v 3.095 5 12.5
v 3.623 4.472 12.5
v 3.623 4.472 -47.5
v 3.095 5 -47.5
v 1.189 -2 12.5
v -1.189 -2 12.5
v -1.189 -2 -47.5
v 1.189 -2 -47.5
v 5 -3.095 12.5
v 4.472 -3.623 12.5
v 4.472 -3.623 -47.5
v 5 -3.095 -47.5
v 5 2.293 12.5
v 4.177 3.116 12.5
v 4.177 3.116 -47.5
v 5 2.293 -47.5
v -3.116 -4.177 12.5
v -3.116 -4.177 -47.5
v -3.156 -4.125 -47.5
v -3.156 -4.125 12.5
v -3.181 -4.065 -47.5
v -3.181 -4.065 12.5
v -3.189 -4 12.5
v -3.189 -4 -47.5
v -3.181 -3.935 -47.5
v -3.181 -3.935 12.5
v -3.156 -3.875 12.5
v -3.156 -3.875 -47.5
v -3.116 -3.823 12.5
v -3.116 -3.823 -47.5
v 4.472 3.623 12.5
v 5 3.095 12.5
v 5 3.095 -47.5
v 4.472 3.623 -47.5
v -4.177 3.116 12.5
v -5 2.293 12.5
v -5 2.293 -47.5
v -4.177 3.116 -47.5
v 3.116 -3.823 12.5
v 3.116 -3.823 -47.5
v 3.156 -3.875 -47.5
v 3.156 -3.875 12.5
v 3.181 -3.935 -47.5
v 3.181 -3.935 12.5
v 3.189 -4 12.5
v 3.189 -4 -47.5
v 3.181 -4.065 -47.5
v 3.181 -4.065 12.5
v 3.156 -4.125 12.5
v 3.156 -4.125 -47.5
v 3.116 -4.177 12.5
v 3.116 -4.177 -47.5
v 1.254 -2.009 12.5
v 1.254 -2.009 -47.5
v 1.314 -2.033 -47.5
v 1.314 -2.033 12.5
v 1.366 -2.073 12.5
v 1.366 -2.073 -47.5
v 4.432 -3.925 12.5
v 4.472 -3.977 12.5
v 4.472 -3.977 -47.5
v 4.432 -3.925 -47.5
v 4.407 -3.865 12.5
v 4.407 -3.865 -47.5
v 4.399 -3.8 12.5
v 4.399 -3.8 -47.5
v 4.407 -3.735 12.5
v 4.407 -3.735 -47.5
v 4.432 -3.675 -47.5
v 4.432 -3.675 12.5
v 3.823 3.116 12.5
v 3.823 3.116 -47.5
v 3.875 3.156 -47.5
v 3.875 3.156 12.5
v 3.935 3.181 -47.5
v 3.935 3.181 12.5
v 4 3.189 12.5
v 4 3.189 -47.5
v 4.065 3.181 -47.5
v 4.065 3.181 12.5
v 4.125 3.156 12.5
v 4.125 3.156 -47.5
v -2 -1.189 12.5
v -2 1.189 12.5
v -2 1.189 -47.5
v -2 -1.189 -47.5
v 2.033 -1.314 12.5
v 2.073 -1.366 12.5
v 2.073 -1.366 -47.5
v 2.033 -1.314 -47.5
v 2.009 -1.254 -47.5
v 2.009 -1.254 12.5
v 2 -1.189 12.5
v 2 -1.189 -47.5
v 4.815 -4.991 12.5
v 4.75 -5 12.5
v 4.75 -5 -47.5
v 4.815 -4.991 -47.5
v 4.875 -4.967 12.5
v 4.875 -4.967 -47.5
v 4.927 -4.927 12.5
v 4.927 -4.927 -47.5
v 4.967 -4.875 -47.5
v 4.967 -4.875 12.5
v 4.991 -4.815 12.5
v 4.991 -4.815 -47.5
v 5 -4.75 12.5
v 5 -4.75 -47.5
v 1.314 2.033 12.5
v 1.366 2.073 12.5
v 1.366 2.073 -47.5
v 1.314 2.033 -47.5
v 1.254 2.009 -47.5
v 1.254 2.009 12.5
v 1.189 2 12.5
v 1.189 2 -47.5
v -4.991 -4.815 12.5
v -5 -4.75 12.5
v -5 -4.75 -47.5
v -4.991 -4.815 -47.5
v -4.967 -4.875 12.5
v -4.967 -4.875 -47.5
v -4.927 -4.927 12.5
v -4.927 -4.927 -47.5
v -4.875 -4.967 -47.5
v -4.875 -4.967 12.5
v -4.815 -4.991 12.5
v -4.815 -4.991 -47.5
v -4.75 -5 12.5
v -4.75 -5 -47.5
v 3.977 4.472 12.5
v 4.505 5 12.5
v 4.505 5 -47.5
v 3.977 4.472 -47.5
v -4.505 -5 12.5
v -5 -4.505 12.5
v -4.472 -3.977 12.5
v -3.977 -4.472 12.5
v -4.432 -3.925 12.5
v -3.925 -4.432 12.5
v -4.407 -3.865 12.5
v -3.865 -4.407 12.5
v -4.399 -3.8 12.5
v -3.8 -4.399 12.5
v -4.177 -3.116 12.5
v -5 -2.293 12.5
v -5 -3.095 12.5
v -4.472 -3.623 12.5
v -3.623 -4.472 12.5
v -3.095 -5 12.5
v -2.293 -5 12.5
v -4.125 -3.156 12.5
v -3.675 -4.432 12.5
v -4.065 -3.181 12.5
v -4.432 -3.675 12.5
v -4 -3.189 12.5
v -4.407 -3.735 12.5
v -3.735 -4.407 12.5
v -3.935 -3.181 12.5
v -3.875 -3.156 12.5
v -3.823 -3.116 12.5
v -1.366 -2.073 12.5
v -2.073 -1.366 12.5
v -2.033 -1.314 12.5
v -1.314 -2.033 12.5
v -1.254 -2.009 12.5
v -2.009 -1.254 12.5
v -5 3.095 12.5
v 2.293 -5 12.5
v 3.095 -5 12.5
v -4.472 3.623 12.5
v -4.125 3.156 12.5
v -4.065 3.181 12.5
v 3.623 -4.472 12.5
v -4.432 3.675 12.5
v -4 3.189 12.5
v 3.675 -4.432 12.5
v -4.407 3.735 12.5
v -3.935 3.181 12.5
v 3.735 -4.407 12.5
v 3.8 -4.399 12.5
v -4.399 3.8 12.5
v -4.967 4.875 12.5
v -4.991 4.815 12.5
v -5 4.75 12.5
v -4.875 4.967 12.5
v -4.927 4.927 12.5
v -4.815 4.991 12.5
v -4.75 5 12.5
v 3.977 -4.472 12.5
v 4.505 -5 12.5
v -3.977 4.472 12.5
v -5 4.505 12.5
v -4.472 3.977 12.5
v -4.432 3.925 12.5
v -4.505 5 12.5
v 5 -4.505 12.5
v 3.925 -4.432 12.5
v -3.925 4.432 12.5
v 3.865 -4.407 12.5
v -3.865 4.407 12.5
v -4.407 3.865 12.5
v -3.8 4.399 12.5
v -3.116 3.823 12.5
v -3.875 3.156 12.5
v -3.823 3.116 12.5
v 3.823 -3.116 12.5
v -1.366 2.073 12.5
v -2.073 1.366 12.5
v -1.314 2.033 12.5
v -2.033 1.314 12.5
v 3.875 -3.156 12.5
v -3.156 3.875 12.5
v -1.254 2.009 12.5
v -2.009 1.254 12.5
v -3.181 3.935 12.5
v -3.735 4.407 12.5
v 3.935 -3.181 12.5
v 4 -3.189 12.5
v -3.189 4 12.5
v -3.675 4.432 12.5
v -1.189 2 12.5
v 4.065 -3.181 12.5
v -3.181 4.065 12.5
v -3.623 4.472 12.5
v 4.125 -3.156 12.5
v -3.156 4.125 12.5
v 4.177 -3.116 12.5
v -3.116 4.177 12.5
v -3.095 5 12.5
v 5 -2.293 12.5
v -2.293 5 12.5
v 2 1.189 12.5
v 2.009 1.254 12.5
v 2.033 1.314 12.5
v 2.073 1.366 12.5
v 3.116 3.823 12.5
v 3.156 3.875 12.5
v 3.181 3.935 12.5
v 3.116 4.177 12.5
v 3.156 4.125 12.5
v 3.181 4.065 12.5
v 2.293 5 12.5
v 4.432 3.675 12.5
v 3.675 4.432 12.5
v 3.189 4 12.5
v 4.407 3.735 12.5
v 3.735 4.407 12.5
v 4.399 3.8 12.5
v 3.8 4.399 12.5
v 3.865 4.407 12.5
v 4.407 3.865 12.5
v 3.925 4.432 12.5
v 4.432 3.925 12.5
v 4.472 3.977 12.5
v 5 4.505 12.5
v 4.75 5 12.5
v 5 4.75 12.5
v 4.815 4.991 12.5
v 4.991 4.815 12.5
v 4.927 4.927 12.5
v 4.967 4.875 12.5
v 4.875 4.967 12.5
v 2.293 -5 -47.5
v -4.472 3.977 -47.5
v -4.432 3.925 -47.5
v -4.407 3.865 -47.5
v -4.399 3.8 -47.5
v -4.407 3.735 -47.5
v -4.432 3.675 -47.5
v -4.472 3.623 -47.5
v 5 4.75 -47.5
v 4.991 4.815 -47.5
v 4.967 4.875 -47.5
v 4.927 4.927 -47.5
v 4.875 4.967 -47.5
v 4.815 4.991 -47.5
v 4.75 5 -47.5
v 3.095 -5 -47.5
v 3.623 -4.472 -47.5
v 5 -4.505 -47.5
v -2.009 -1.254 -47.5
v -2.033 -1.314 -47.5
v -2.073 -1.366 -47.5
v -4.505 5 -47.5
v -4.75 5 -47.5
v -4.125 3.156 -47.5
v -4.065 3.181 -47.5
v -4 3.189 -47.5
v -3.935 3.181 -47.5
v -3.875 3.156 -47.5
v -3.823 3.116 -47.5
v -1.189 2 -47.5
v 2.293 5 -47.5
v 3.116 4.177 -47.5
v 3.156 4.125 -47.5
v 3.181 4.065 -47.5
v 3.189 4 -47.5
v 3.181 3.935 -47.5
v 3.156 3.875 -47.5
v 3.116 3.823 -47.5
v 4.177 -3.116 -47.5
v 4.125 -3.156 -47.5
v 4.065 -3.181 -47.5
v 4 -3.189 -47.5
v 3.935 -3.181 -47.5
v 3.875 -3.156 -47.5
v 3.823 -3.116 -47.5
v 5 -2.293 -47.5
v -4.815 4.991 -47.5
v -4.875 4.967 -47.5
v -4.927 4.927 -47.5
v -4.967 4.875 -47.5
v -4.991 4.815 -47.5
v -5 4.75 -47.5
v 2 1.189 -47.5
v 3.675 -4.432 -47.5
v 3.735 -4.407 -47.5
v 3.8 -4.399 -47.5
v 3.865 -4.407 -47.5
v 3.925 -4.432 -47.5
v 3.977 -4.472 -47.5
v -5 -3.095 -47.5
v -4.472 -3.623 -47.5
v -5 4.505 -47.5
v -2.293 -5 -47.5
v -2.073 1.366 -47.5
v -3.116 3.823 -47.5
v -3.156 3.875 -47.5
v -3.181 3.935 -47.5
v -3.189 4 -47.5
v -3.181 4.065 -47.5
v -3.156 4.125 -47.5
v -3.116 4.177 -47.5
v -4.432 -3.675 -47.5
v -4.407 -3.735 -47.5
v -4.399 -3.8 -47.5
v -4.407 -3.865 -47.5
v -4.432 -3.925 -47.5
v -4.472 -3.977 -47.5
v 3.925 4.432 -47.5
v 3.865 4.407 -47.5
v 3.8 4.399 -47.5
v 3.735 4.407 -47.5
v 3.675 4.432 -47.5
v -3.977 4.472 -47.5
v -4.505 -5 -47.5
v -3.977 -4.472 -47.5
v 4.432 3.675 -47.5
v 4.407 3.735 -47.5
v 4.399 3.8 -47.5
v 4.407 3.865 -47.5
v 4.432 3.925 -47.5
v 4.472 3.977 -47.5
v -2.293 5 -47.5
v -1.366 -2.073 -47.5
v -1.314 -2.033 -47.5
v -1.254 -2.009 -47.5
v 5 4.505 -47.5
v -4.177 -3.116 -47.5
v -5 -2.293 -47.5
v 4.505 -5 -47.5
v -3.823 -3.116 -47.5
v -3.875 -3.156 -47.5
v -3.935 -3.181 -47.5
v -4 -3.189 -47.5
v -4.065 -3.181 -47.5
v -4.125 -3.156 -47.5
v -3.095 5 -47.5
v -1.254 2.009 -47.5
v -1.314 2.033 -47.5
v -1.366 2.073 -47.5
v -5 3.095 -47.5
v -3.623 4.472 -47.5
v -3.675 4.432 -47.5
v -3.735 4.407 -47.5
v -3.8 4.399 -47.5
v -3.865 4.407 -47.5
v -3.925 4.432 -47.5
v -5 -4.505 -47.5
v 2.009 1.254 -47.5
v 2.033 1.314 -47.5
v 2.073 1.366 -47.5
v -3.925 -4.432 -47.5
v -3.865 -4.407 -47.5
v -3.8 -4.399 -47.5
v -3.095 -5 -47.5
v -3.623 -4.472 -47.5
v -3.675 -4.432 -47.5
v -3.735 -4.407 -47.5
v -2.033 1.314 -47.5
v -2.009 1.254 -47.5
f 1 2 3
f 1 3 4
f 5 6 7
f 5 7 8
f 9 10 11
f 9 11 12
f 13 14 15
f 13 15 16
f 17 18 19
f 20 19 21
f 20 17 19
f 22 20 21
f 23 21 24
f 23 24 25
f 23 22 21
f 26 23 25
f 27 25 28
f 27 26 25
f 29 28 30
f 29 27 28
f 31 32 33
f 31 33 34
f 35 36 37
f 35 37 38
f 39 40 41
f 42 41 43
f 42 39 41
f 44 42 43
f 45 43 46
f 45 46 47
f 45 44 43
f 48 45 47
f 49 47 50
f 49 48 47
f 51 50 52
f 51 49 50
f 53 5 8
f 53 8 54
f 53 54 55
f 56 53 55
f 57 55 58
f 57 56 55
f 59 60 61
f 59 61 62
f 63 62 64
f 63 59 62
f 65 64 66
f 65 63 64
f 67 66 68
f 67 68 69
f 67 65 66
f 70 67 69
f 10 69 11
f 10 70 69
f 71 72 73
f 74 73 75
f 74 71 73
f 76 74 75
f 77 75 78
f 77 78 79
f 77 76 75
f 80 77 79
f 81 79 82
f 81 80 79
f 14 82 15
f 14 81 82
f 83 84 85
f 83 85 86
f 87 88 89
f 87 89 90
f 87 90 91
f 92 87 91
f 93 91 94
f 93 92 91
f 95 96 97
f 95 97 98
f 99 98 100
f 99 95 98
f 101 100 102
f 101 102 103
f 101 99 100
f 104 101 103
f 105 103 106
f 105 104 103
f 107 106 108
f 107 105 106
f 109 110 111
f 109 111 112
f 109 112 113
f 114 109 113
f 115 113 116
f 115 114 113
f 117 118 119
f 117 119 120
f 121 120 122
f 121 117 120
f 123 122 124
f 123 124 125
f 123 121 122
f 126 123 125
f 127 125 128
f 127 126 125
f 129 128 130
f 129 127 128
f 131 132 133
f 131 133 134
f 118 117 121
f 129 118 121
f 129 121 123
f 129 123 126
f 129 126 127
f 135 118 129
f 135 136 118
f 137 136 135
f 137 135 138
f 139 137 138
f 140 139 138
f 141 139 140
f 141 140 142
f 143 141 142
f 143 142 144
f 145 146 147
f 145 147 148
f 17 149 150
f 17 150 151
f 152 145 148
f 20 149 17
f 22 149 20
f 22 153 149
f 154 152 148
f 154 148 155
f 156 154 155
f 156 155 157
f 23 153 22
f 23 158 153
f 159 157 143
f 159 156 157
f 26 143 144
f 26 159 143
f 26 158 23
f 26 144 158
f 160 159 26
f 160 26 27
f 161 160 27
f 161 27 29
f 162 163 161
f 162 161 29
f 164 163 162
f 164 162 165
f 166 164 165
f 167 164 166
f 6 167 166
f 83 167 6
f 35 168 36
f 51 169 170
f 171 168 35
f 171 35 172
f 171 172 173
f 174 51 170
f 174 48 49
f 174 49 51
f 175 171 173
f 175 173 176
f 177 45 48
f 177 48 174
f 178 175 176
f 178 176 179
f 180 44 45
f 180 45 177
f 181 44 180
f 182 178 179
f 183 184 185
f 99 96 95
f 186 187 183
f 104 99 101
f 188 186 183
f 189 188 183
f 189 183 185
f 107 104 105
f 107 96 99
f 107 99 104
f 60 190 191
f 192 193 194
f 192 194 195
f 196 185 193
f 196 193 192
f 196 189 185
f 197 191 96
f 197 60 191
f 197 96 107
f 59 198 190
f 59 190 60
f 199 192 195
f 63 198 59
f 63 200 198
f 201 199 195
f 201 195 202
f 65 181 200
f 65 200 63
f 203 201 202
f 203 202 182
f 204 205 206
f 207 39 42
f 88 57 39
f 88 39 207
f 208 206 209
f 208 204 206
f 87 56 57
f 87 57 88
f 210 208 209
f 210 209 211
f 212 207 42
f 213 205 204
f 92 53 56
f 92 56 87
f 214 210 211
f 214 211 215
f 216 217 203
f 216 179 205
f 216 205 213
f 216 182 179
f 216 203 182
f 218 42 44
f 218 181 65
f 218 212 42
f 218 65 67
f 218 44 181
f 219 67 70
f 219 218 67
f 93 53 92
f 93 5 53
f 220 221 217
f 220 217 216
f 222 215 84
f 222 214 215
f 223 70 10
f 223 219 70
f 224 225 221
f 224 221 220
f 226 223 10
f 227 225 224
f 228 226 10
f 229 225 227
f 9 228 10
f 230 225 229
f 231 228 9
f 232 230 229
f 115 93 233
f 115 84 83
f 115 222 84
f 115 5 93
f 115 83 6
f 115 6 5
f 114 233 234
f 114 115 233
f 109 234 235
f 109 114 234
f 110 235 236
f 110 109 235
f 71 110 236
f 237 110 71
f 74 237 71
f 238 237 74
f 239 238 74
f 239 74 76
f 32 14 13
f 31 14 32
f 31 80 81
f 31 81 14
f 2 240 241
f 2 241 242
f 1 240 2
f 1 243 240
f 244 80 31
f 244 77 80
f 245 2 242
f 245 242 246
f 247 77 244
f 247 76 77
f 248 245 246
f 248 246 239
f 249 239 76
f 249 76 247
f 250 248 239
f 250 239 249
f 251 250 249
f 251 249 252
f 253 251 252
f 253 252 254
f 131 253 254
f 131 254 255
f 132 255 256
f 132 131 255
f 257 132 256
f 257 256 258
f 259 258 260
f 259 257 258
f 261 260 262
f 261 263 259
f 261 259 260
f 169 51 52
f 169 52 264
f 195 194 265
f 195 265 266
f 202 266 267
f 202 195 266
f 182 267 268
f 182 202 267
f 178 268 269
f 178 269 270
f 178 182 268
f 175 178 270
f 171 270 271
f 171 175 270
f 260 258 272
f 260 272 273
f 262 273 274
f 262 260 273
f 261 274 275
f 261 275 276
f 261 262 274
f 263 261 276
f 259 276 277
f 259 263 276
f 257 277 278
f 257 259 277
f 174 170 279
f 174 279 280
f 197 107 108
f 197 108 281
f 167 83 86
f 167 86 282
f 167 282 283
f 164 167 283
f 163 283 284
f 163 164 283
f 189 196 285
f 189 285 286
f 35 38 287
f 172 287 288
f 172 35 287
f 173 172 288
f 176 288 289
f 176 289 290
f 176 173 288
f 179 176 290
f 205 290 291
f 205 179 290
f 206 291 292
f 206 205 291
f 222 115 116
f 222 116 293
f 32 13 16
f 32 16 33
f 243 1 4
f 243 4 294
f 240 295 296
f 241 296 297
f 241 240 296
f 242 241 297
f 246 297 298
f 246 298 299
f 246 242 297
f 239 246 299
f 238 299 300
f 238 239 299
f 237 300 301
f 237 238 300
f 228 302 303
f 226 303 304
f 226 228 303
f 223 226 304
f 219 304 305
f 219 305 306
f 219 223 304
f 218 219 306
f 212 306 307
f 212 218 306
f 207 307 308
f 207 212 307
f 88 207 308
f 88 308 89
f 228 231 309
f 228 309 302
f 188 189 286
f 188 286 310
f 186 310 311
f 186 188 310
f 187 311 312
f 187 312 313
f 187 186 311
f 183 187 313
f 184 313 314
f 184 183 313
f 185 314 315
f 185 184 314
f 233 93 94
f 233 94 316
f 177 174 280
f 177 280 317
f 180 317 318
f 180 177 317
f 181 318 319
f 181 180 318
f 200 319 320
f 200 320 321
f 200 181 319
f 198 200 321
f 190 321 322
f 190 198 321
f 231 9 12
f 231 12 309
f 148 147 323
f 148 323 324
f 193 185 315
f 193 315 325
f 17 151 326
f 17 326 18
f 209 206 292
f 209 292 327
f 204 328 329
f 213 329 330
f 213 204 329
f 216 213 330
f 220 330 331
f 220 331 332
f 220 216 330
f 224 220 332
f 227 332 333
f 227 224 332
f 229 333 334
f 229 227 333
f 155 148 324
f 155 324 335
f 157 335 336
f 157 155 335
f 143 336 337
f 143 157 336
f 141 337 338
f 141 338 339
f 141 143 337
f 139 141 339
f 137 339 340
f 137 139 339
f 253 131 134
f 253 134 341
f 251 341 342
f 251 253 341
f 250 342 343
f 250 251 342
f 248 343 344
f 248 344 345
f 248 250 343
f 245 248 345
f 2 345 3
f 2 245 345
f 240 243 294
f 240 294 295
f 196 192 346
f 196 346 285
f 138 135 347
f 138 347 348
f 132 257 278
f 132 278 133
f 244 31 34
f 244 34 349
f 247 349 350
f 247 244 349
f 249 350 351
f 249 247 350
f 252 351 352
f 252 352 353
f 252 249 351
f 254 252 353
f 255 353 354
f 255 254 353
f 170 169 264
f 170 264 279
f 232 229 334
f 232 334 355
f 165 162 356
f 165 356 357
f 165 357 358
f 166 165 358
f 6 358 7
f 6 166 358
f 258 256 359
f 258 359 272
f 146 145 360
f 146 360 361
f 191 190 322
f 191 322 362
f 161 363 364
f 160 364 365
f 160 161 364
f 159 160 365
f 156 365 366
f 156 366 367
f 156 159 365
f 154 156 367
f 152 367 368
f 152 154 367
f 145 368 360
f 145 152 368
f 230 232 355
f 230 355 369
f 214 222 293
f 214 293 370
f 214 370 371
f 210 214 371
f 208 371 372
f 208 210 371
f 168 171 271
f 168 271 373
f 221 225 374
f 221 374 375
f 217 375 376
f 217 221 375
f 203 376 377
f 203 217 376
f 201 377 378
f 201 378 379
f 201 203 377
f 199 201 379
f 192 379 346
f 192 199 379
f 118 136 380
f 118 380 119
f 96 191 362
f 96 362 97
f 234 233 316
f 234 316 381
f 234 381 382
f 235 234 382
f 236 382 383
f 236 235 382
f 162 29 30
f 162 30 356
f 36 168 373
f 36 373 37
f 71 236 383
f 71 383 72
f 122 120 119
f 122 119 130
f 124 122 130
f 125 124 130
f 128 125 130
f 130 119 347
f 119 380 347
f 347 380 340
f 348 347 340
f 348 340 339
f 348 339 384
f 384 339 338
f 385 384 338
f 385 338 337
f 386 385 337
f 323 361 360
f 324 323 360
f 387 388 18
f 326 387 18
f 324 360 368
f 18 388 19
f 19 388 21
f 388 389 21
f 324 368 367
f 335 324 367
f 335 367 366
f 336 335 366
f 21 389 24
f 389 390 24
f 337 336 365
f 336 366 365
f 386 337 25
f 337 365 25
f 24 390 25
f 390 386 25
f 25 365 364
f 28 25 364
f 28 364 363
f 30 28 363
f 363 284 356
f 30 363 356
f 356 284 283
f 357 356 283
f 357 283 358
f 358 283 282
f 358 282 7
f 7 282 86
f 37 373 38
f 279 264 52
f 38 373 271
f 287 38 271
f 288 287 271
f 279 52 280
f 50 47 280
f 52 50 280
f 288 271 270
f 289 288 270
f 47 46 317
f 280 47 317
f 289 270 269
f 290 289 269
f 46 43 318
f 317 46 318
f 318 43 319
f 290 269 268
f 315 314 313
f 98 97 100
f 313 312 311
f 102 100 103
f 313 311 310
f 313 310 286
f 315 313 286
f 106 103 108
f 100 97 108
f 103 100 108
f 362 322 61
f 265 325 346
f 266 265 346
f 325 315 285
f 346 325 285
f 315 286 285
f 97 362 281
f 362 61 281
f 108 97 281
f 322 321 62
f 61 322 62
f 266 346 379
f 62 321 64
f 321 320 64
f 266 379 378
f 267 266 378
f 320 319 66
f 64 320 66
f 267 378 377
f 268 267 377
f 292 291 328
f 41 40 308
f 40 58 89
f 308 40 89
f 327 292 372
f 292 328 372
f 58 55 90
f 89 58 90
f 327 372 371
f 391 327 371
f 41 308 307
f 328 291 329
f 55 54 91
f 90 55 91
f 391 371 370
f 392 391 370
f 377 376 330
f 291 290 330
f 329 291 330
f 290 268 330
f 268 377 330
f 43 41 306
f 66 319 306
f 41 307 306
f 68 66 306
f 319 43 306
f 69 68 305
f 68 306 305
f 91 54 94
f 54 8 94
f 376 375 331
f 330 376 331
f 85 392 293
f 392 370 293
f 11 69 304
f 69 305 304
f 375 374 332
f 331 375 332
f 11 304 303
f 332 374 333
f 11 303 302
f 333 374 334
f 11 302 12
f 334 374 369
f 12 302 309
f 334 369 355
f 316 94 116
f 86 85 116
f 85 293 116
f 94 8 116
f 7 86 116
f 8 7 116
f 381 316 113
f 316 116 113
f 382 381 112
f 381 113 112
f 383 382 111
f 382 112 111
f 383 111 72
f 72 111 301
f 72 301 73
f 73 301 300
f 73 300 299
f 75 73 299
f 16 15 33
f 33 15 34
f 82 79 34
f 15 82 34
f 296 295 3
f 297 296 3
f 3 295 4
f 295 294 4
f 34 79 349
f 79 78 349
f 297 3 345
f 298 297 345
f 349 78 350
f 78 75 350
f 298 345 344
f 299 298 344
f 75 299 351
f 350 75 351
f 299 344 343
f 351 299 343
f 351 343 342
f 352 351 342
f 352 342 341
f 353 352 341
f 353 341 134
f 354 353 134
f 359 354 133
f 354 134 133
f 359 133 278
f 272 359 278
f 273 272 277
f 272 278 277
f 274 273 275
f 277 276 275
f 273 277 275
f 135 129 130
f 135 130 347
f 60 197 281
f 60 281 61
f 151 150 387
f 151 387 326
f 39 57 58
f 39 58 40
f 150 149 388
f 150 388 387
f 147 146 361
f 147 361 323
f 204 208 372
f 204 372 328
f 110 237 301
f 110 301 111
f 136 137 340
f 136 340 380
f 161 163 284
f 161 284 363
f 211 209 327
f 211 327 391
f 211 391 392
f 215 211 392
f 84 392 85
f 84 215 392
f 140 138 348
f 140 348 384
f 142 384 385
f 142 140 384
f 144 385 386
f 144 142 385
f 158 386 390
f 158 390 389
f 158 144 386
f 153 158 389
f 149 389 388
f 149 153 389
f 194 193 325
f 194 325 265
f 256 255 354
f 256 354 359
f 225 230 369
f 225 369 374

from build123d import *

# Parameters (mm, degrees)
BOSS_EXTRUDE1_DEPTH = 60


with BuildPart() as part:
    # Sketch1 → Boss-Extrude1 (new body)
    with BuildSketch(Plane.XY.offset(12.5)):
        with BuildLine():
            Line((1.189339828, 2), (-1.189339828, 2))
            ThreePointArc((-1.189339828, 2), (-1.285010686, 2.019030117), (-1.366116524, 2.073223305))
            Line((-1.366116524, 2.073223305), (-3.116116524, 3.823223305))
            ThreePointArc((-3.116116524, 3.823223305), (-3.189339828, 4), (-3.116116524, 4.176776695))
            Line((-3.116116524, 4.176776695), (-2.292893219, 5))
            Line((-2.292893219, 5), (-3.094974747, 5))
            Line((-3.094974747, 5), (-3.623223305, 4.471751442))
            ThreePointArc((-3.623223305, 4.471751442), (-3.8, 4.398528137), (-3.976776695, 4.471751442))
            Line((-3.976776695, 4.471751442), (-4.505025253, 5))
            Line((-4.505025253, 5), (-4.75, 5))
            ThreePointArc((-4.75, 5), (-4.926776695, 4.926776695), (-5, 4.75))
            Line((-5, 4.75), (-5, 4.505025253))
            Line((-5, 4.505025253), (-4.471751442, 3.976776695))
            ThreePointArc((-4.471751442, 3.976776695), (-4.398528137, 3.8), (-4.471751442, 3.623223305))
            Line((-4.471751442, 3.623223305), (-5, 3.094974747))
            Line((-5, 3.094974747), (-5, 2.292893219))
            Line((-5, 2.292893219), (-4.176776695, 3.116116524))
            ThreePointArc((-4.176776695, 3.116116524), (-4, 3.189339828), (-3.823223305, 3.116116524))
            Line((-3.823223305, 3.116116524), (-2.073223305, 1.366116524))
            ThreePointArc((-2.073223305, 1.366116524), (-2.019030117, 1.285010686), (-2, 1.189339828))
            Line((-2, 1.189339828), (-2, -1.189339828))
            ThreePointArc((-2, -1.189339828), (-2.019030117, -1.285010686), (-2.073223305, -1.366116524))
            Line((-2.073223305, -1.366116524), (-3.823223305, -3.116116524))
            ThreePointArc((-3.823223305, -3.116116524), (-4, -3.189339828), (-4.176776695, -3.116116524))
            Line((-4.176776695, -3.116116524), (-5, -2.292893219))
            Line((-5, -2.292893219), (-5, -3.094974747))
            Line((-5, -3.094974747), (-4.471751442, -3.623223305))
            ThreePointArc((-4.471751442, -3.623223305), (-4.398528137, -3.8), (-4.471751442, -3.976776695))
            Line((-4.471751442, -3.976776695), (-5, -4.505025253))
            Line((-5, -4.505025253), (-5, -4.75))
            ThreePointArc((-5, -4.75), (-4.926776695, -4.926776695), (-4.75, -5))
            Line((-4.75, -5), (-4.505025253, -5))
            Line((-4.505025253, -5), (-3.976776695, -4.471751442))
            ThreePointArc((-3.976776695, -4.471751442), (-3.8, -4.398528137), (-3.623223305, -4.471751442))
            Line((-3.623223305, -4.471751442), (-3.094974747, -5))
            Line((-3.094974747, -5), (-2.292893219, -5))
            Line((-2.292893219, -5), (-3.116116524, -4.176776695))
            ThreePointArc((-3.116116524, -4.176776695), (-3.189339828, -4), (-3.116116524, -3.823223305))
            Line((-3.116116524, -3.823223305), (-1.366116524, -2.073223305))
            ThreePointArc((-1.366116524, -2.073223305), (-1.285010686, -2.019030117), (-1.189339828, -2))
            Line((-1.189339828, -2), (1.189339828, -2))
            ThreePointArc((1.189339828, -2), (1.285010686, -2.019030117), (1.366116524, -2.073223305))
            Line((1.366116524, -2.073223305), (3.116116524, -3.823223305))
            ThreePointArc((3.116116524, -3.823223305), (3.189339828, -4), (3.116116524, -4.176776695))
            Line((3.116116524, -4.176776695), (2.292893219, -5))
            Line((2.292893219, -5), (3.094974747, -5))
            Line((3.094974747, -5), (3.623223305, -4.471751442))
            ThreePointArc((3.623223305, -4.471751442), (3.8, -4.398528137), (3.976776695, -4.471751442))
            Line((3.976776695, -4.471751442), (4.505025253, -5))
            Line((4.505025253, -5), (4.75, -5))
            ThreePointArc((4.75, -5), (4.926776695, -4.926776695), (5, -4.75))
            Line((5, -4.75), (5, -4.505025253))
            Line((5, -4.505025253), (4.471751442, -3.976776695))
            ThreePointArc((4.471751442, -3.976776695), (4.398528137, -3.8), (4.471751442, -3.623223305))
            Line((4.471751442, -3.623223305), (5, -3.094974747))
            Line((5, -3.094974747), (5, -2.292893219))
            Line((5, -2.292893219), (4.176776695, -3.116116524))
            ThreePointArc((4.176776695, -3.116116524), (4, -3.189339828), (3.823223305, -3.116116524))
            Line((3.823223305, -3.116116524), (2.073223305, -1.366116524))
            ThreePointArc((2.073223305, -1.366116524), (2.019030117, -1.285010686), (2, -1.189339828))
            Line((2, -1.189339828), (2, 1.189339828))
            ThreePointArc((2, 1.189339828), (2.019030117, 1.285010686), (2.073223305, 1.366116524))
            Line((2.073223305, 1.366116524), (3.823223305, 3.116116524))
            ThreePointArc((3.823223305, 3.116116524), (4, 3.189339828), (4.176776695, 3.116116524))
            Line((4.176776695, 3.116116524), (5, 2.292893219))
            Line((5, 2.292893219), (5, 3.094974747))
            Line((5, 3.094974747), (4.471751442, 3.623223305))
            ThreePointArc((4.471751442, 3.623223305), (4.398528137, 3.8), (4.471751442, 3.976776695))
            Line((4.471751442, 3.976776695), (5, 4.505025253))
            Line((5, 4.505025253), (5, 4.75))
            ThreePointArc((5, 4.75), (4.926776695, 4.926776695), (4.75, 5))
            Line((4.75, 5), (4.505025253, 5))
            Line((4.505025253, 5), (3.976776695, 4.471751442))
            ThreePointArc((3.976776695, 4.471751442), (3.8, 4.398528137), (3.623223305, 4.471751442))
            Line((3.623223305, 4.471751442), (3.094974747, 5))
            Line((3.094974747, 5), (2.292893219, 5))
            Line((2.292893219, 5), (3.116116524, 4.176776695))
            ThreePointArc((3.116116524, 4.176776695), (3.189339828, 4), (3.116116524, 3.823223305))
            Line((3.116116524, 3.823223305), (1.366116524, 2.073223305))
            ThreePointArc((1.366116524, 2.073223305), (1.285010686, 2.019030117), (1.189339828, 2))
        make_face()
    extrude(amount=-BOSS_EXTRUDE1_DEPTH)


solid = part.part
